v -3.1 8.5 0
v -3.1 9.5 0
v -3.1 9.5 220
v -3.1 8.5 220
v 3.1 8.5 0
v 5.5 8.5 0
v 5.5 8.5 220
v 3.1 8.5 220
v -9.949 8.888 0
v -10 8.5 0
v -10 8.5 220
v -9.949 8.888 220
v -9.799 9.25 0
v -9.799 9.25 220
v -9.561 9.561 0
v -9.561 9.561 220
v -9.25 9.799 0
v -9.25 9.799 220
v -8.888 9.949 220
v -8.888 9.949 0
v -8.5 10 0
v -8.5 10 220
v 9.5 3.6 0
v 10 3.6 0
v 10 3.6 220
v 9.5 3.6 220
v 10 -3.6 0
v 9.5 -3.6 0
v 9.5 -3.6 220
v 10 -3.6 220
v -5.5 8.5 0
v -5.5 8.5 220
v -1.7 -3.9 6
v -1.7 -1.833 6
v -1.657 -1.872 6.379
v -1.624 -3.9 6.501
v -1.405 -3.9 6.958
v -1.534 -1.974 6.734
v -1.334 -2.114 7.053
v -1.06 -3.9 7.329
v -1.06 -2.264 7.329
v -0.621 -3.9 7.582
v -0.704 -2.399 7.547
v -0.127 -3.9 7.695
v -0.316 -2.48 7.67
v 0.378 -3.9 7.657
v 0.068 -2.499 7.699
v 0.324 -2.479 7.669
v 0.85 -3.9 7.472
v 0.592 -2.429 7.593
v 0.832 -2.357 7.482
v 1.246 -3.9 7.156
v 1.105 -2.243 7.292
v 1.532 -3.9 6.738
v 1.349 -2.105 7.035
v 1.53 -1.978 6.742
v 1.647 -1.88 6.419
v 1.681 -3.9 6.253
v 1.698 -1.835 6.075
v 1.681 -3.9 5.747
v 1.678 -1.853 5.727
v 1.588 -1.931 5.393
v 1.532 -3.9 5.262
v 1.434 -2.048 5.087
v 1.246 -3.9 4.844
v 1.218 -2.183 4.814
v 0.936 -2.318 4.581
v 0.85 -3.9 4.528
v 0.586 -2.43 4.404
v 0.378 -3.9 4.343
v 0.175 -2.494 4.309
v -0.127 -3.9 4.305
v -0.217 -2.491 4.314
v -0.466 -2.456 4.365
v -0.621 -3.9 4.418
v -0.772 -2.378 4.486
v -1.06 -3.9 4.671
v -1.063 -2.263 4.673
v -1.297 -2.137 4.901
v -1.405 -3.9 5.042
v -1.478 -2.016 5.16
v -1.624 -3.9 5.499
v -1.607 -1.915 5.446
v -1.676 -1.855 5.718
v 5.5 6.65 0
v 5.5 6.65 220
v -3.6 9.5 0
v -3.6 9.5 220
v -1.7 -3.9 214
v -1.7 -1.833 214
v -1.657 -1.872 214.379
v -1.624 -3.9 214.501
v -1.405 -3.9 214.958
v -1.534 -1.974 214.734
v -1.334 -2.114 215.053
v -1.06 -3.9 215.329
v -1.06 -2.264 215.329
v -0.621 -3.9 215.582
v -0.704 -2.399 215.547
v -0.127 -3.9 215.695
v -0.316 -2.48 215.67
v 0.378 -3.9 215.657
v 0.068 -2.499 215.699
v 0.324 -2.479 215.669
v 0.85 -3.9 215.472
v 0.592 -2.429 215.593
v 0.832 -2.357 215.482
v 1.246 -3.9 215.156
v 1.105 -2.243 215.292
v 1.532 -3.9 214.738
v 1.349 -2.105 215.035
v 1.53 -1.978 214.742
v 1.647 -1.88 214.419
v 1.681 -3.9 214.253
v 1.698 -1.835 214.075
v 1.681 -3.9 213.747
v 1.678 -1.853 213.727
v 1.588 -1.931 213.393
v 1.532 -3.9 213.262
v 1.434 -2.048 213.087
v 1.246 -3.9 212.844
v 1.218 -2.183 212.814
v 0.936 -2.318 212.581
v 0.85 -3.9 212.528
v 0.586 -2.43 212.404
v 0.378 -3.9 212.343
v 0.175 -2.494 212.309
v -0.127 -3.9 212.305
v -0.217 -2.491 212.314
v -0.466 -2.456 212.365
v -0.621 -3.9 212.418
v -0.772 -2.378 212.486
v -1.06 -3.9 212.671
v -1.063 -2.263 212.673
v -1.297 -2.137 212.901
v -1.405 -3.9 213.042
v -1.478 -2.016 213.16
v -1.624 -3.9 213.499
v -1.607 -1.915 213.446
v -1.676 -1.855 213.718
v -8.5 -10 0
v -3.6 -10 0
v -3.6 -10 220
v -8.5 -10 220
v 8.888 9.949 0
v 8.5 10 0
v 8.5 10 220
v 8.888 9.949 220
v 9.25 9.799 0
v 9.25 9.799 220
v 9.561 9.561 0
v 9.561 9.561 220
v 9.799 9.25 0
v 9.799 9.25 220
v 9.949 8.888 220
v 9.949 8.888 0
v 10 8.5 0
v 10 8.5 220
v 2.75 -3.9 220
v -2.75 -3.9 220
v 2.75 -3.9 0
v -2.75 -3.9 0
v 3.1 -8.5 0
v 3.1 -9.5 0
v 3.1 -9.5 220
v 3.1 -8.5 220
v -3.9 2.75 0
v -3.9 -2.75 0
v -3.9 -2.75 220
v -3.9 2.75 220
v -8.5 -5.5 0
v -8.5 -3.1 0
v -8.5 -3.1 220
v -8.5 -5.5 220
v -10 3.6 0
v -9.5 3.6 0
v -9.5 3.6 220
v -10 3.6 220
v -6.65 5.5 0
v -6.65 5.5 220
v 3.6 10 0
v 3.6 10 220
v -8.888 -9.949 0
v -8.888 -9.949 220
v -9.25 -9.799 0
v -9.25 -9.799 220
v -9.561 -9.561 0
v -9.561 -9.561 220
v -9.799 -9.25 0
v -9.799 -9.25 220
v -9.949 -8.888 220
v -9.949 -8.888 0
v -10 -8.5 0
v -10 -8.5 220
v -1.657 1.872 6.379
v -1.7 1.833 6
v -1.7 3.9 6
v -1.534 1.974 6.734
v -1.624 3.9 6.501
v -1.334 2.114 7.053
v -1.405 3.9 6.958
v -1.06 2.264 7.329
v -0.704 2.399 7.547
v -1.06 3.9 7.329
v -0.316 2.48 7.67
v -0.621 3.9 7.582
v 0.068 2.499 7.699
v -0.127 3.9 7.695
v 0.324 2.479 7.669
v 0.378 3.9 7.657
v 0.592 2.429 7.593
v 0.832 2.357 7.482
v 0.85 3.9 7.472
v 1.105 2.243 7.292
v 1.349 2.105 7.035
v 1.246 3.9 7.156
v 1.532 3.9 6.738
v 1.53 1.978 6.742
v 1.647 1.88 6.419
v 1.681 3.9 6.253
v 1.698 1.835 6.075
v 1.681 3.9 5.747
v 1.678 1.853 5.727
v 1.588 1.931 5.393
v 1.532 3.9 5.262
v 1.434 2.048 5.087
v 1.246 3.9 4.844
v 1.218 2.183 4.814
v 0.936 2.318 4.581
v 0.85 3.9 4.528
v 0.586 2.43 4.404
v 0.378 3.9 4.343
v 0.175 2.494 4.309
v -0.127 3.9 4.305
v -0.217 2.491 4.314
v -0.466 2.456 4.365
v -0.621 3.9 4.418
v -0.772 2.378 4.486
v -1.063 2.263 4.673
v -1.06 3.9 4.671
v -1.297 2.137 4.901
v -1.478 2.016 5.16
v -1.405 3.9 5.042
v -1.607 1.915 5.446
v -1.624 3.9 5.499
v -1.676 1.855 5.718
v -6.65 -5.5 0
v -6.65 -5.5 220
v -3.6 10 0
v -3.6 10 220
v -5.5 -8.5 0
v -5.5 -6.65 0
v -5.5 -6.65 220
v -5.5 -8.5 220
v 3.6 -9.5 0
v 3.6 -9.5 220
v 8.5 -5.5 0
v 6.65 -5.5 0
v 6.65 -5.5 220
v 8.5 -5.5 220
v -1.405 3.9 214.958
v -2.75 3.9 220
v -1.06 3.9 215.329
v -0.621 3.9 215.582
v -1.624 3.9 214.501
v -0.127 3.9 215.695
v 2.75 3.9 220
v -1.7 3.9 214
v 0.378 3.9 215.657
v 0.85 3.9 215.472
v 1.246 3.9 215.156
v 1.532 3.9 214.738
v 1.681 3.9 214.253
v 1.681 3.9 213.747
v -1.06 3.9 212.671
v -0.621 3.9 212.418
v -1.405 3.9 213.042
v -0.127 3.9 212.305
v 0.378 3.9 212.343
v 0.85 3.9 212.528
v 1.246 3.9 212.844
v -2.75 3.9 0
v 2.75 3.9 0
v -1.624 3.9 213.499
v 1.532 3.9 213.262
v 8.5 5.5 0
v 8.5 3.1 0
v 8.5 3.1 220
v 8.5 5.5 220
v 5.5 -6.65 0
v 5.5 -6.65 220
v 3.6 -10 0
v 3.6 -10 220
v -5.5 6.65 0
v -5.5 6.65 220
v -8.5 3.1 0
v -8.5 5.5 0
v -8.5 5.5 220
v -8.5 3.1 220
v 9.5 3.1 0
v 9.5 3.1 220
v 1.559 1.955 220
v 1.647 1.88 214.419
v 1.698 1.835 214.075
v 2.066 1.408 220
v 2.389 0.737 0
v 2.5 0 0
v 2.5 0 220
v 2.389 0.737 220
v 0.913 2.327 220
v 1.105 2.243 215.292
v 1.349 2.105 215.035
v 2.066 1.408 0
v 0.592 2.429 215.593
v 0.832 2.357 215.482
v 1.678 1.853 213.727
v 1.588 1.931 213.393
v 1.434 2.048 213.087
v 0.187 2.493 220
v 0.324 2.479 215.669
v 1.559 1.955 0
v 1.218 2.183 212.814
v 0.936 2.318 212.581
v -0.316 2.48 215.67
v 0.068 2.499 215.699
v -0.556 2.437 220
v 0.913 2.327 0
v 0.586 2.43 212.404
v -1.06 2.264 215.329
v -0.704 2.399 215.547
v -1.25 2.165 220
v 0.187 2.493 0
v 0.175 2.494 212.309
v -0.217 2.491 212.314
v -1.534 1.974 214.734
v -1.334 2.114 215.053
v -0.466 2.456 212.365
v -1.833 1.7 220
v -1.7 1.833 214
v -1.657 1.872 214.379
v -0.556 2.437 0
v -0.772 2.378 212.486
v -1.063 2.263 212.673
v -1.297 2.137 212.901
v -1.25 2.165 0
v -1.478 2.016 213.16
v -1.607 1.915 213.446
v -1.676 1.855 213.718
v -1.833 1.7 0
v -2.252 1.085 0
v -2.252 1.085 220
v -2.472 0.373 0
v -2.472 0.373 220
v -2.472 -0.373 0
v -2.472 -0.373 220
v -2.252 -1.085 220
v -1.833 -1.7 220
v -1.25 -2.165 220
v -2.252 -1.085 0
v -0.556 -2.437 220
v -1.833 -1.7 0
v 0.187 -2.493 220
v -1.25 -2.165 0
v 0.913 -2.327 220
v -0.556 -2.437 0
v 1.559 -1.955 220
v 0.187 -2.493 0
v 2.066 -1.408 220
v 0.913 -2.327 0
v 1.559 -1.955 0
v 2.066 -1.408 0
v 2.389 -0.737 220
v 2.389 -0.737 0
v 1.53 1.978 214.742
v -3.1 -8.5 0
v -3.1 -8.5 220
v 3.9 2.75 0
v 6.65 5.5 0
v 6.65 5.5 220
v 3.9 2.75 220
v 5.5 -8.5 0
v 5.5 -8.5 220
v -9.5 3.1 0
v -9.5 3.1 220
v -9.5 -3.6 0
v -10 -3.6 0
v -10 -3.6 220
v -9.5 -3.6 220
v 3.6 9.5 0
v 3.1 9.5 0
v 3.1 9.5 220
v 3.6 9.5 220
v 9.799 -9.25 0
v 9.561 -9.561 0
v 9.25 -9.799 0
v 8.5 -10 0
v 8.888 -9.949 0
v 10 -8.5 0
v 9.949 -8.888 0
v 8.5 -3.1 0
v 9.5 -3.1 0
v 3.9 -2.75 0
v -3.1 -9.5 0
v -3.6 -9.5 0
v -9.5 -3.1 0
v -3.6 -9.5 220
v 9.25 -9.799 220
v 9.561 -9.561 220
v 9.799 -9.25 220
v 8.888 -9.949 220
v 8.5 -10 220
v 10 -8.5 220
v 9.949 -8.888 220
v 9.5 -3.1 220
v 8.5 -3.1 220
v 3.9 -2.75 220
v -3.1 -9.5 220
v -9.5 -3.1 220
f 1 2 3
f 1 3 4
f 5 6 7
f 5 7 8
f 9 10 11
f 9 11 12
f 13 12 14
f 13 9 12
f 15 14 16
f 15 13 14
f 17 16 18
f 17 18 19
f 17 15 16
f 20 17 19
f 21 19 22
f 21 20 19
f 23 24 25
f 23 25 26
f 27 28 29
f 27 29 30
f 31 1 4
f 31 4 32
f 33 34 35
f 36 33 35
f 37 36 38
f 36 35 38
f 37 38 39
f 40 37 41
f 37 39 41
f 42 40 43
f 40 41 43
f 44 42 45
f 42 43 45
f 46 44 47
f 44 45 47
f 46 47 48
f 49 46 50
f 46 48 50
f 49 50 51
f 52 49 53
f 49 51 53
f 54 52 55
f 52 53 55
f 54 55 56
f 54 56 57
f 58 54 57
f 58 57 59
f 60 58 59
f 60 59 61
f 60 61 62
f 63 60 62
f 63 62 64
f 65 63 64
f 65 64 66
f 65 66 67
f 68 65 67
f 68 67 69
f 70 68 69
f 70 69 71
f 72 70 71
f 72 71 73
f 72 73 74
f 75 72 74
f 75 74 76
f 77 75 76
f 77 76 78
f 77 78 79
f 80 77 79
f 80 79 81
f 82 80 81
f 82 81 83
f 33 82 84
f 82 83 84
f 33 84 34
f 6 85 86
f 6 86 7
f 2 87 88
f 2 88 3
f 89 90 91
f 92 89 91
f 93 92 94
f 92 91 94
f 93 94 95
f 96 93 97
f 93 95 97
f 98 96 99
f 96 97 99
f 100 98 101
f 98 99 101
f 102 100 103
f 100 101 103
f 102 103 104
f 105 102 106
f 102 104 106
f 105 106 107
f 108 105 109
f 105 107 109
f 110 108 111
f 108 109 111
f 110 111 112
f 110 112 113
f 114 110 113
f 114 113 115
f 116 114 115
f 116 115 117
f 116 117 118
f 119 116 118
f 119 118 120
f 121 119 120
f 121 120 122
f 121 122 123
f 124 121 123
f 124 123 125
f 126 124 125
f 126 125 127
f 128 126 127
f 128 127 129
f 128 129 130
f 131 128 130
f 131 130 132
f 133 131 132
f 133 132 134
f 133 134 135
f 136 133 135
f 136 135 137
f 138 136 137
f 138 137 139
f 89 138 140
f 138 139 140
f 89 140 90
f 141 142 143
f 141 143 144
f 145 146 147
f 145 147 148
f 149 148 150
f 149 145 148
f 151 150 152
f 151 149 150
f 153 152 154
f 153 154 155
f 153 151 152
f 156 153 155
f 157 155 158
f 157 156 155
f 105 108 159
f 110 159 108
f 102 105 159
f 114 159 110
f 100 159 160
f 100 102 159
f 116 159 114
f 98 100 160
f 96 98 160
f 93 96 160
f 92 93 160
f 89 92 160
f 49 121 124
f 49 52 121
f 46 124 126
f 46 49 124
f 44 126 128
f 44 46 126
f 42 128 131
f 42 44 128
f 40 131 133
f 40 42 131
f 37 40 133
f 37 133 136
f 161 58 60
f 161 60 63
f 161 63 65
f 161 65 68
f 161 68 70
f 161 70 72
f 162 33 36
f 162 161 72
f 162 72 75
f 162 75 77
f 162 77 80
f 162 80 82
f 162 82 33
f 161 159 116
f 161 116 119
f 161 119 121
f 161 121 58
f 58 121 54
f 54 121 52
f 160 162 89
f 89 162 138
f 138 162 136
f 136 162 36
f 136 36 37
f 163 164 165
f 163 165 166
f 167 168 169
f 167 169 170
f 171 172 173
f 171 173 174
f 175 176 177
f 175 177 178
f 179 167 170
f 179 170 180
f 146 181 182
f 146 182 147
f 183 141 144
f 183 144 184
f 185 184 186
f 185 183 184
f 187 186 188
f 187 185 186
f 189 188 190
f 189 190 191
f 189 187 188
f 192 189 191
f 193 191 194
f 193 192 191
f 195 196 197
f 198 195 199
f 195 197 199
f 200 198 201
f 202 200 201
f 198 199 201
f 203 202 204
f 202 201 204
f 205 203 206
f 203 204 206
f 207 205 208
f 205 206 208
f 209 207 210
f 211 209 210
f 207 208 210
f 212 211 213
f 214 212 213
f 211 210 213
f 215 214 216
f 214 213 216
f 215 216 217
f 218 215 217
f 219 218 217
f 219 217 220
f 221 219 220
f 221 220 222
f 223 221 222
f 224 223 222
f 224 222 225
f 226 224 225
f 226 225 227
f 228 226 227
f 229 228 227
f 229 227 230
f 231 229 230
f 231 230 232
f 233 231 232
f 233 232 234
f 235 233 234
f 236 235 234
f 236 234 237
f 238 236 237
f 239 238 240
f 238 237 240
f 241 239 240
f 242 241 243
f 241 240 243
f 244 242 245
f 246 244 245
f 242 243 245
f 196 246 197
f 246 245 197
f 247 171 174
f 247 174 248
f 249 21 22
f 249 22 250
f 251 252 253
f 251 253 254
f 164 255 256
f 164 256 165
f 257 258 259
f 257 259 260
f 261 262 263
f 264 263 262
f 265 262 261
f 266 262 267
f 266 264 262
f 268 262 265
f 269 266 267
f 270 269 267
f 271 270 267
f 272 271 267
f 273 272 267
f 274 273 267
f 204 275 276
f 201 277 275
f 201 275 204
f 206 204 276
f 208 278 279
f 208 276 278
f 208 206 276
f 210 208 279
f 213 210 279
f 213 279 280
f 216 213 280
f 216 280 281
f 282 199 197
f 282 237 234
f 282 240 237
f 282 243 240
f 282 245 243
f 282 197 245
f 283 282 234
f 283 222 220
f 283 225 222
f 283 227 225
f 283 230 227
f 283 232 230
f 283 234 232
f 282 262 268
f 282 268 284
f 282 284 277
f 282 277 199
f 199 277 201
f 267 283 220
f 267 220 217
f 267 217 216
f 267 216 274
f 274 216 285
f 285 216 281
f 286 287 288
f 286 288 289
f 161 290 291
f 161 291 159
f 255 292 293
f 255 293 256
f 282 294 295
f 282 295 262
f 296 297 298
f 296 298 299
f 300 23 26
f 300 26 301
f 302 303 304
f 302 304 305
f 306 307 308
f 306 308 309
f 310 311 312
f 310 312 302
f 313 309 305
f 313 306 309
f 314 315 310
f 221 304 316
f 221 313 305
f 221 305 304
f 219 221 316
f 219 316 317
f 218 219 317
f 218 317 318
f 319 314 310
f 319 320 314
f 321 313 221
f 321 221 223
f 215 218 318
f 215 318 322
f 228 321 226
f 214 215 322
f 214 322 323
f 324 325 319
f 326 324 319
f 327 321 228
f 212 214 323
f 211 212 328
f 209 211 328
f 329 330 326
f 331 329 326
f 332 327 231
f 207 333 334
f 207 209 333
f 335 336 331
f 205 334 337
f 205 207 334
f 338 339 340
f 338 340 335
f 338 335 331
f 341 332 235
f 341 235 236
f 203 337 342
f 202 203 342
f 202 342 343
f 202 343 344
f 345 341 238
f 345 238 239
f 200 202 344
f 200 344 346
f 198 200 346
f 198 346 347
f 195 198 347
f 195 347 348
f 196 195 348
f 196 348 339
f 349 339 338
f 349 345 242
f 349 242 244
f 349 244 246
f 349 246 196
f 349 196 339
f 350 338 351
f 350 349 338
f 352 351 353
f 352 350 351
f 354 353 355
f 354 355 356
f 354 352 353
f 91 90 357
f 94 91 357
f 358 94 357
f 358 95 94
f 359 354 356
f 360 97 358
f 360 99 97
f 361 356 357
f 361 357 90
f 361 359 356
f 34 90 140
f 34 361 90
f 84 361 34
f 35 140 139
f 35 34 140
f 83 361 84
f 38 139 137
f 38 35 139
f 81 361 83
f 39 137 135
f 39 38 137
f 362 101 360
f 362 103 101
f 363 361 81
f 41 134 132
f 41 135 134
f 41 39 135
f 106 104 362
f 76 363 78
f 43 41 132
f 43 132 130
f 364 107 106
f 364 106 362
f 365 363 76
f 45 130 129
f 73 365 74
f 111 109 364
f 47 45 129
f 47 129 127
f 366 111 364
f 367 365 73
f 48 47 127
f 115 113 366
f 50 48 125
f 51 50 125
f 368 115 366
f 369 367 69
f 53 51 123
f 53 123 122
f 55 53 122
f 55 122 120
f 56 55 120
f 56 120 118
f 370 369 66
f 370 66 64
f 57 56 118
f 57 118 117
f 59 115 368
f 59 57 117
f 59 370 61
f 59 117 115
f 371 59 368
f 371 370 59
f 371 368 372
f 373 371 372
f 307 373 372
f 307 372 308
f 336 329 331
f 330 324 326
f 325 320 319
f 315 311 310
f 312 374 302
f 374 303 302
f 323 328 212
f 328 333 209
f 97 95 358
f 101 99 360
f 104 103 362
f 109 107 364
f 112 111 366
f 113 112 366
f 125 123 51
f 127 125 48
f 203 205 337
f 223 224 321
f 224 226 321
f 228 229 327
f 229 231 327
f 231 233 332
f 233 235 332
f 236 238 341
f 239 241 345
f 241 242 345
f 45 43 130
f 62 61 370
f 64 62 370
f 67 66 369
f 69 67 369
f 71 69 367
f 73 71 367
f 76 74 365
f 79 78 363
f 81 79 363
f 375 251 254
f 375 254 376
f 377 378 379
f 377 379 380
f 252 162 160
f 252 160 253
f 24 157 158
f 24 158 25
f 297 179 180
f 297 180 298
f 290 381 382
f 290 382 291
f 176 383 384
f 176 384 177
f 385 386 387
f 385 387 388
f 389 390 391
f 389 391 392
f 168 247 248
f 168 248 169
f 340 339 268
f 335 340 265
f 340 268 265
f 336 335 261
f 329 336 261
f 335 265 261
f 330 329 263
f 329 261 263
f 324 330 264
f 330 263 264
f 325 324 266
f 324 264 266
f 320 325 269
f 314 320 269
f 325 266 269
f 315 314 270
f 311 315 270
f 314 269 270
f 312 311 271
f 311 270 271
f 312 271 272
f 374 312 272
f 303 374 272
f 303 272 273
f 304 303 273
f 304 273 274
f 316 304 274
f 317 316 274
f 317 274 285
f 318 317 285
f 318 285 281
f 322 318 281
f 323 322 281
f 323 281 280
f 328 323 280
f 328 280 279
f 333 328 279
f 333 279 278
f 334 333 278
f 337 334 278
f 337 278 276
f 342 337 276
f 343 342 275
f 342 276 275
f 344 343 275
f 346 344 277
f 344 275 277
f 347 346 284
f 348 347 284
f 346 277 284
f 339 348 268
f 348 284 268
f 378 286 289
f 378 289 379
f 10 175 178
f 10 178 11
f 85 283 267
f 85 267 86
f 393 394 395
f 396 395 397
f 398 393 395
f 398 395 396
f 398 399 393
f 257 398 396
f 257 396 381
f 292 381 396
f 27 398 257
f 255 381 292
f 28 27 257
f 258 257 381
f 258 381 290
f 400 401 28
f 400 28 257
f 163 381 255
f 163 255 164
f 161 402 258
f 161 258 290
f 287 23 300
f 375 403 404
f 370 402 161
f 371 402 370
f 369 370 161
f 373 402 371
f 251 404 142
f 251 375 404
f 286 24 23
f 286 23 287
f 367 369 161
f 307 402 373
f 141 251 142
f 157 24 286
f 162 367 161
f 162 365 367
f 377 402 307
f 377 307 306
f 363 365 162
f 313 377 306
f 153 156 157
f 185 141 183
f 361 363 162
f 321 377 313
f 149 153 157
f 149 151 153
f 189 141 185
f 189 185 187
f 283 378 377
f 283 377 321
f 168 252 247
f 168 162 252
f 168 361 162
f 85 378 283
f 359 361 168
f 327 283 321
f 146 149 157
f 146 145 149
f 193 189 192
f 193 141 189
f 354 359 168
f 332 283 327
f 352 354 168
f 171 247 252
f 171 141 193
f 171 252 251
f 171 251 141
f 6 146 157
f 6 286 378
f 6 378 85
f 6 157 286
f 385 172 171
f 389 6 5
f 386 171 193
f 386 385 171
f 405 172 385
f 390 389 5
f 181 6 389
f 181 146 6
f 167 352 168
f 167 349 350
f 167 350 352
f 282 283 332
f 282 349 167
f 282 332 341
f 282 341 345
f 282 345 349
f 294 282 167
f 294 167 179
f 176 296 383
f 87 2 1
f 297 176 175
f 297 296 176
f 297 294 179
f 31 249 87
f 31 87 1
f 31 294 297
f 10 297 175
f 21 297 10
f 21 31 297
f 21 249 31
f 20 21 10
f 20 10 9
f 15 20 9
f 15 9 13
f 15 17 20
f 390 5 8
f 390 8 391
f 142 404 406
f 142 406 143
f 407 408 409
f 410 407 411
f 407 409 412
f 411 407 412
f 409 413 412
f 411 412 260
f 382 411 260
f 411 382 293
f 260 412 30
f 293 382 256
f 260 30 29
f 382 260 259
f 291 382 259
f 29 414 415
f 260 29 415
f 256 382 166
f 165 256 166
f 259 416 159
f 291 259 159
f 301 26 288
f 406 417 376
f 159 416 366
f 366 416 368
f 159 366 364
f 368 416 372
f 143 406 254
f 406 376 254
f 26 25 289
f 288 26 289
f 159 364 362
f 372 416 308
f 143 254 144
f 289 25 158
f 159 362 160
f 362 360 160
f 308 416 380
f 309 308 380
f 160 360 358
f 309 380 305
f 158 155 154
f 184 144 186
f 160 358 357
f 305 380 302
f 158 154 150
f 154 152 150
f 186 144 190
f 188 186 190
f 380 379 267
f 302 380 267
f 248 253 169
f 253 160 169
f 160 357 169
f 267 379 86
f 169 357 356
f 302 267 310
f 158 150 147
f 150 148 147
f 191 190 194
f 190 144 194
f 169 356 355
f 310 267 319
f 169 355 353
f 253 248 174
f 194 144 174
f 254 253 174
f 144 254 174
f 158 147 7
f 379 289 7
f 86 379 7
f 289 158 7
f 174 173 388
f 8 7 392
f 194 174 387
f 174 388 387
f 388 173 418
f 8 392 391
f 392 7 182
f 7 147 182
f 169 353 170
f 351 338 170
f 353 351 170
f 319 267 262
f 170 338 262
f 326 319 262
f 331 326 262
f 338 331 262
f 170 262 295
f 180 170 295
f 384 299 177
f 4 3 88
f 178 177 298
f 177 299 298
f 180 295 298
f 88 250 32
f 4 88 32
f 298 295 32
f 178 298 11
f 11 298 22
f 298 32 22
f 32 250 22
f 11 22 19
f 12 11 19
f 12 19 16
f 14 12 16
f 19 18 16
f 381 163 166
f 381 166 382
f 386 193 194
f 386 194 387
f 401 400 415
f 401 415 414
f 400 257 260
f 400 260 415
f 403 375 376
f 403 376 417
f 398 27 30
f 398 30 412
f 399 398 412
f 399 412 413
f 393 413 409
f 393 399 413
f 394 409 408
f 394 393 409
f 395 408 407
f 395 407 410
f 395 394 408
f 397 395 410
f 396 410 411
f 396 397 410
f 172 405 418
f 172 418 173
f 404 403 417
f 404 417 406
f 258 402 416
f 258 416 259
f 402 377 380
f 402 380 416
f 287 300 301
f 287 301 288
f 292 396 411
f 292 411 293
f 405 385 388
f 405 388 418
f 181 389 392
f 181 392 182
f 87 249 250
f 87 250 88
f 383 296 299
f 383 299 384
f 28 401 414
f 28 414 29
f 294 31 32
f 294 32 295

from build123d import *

# Parameters (mm, degrees)
SKETCH1_R           = 2.5
EXTRUDE_1_DEPTH     = 220
SKETCH_1_R          = 1.7
CUT_EXTRUDE_1_DEPTH = 221.665380157


with BuildPart() as part:
    # Sketch1 → 凸台-拉伸1 (new body)
    with BuildSketch(Plane.XY):
        with BuildLine():
            Line((-3.6, 10), (-3.6, 9.5))
            Line((-3.6, 9.5), (-3.1, 9.5))
            Line((-3.1, 9.5), (-3.1, 8.5))
            Line((-3.1, 8.5), (-5.5, 8.5))
            Line((-5.5, 8.5), (-5.5, 6.65))
            Line((-5.5, 6.65), (-2.75, 3.9))
            Line((-2.75, 3.9), (2.75, 3.9))
            Line((2.75, 3.9), (5.5, 6.65))
            Line((5.5, 6.65), (5.5, 8.5))
            Line((5.5, 8.5), (3.1, 8.5))
            Line((3.1, 8.5), (3.1, 9.5))
            Line((3.1, 9.5), (3.6, 9.5))
            Line((3.6, 9.5), (3.6, 10))
            Line((3.6, 10), (8.5, 10))
            ThreePointArc((8.5, 10), (9.560660172, 9.560660172), (10, 8.5))
            Line((10, 8.5), (10, 3.6))
            Line((10, 3.6), (9.5, 3.6))
            Line((9.5, 3.6), (9.5, 3.1))
            Line((9.5, 3.1), (8.5, 3.1))
            Line((8.5, 3.1), (8.5, 5.5))
            Line((8.5, 5.5), (6.65, 5.5))
            Line((6.65, 5.5), (3.9, 2.75))
            Line((3.9, 2.75), (3.9, -2.75))
            Line((3.9, -2.75), (6.65, -5.5))
            Line((6.65, -5.5), (8.5, -5.5))
            Line((8.5, -5.5), (8.5, -3.1))
            Line((8.5, -3.1), (9.5, -3.1))
            Line((9.5, -3.1), (9.5, -3.6))
            Line((9.5, -3.6), (10, -3.6))
            Line((10, -3.6), (10, -8.5))
            ThreePointArc((10, -8.5), (9.560660172, -9.560660172), (8.5, -10))
            Line((8.5, -10), (3.6, -10))
            Line((3.6, -10), (3.6, -9.5))
            Line((3.6, -9.5), (3.1, -9.5))
            Line((3.1, -9.5), (3.1, -8.5))
            Line((3.1, -8.5), (5.5, -8.5))
            Line((5.5, -8.5), (5.5, -6.65))
            Line((5.5, -6.65), (2.75, -3.9))
            Line((2.75, -3.9), (-2.75, -3.9))
            Line((-2.75, -3.9), (-5.5, -6.65))
            Line((-5.5, -6.65), (-5.5, -8.5))
            Line((-5.5, -8.5), (-3.1, -8.5))
            Line((-3.1, -8.5), (-3.1, -9.5))
            Line((-3.1, -9.5), (-3.6, -9.5))
            Line((-3.6, -9.5), (-3.6, -10))
            Line((-3.6, -10), (-8.5, -10))
            ThreePointArc((-8.5, -10), (-9.560660172, -9.560660172), (-10, -8.5))
            Line((-10, -8.5), (-10, -3.6))
            Line((-10, -3.6), (-9.5, -3.6))
            Line((-9.5, -3.6), (-9.5, -3.1))
            Line((-9.5, -3.1), (-8.5, -3.1))
            Line((-8.5, -3.1), (-8.5, -5.5))
            Line((-8.5, -5.5), (-6.65, -5.5))
            Line((-6.65, -5.5), (-3.9, -2.75))
            Line((-3.9, -2.75), (-3.9, 2.75))
            Line((-3.9, 2.75), (-6.65, 5.5))
            Line((-6.65, 5.5), (-8.5, 5.5))
            Line((-8.5, 5.5), (-8.5, 3.1))
            Line((-8.5, 3.1), (-9.5, 3.1))
            Line((-9.5, 3.1), (-9.5, 3.6))
            Line((-9.5, 3.6), (-10, 3.6))
            Line((-10, 3.6), (-10, 8.5))
            ThreePointArc((-10, 8.5), (-9.560660172, 9.560660172), (-8.5, 10))
            Line((-8.5, 10), (-3.6, 10))
        make_face()
        Circle(SKETCH1_R, mode=Mode.SUBTRACT)
    extrude(amount=EXTRUDE_1_DEPTH)

    # 草图1 → 切除-拉伸1 (cut, through all)
    with BuildSketch(Plane(origin=(0, 3.9, 0), x_dir=(1, 0, 0), z_dir=(0, 1, 0))):
        with Locations(Location((0, -214, 0), (0, 0, 180))):
            Circle(SKETCH_1_R)
        with Locations(Location((0, -6, 0), (0, 0, 180))):
            Circle(SKETCH_1_R)
    extrude(amount=-CUT_EXTRUDE_1_DEPTH, mode=Mode.SUBTRACT)


solid = part.part
